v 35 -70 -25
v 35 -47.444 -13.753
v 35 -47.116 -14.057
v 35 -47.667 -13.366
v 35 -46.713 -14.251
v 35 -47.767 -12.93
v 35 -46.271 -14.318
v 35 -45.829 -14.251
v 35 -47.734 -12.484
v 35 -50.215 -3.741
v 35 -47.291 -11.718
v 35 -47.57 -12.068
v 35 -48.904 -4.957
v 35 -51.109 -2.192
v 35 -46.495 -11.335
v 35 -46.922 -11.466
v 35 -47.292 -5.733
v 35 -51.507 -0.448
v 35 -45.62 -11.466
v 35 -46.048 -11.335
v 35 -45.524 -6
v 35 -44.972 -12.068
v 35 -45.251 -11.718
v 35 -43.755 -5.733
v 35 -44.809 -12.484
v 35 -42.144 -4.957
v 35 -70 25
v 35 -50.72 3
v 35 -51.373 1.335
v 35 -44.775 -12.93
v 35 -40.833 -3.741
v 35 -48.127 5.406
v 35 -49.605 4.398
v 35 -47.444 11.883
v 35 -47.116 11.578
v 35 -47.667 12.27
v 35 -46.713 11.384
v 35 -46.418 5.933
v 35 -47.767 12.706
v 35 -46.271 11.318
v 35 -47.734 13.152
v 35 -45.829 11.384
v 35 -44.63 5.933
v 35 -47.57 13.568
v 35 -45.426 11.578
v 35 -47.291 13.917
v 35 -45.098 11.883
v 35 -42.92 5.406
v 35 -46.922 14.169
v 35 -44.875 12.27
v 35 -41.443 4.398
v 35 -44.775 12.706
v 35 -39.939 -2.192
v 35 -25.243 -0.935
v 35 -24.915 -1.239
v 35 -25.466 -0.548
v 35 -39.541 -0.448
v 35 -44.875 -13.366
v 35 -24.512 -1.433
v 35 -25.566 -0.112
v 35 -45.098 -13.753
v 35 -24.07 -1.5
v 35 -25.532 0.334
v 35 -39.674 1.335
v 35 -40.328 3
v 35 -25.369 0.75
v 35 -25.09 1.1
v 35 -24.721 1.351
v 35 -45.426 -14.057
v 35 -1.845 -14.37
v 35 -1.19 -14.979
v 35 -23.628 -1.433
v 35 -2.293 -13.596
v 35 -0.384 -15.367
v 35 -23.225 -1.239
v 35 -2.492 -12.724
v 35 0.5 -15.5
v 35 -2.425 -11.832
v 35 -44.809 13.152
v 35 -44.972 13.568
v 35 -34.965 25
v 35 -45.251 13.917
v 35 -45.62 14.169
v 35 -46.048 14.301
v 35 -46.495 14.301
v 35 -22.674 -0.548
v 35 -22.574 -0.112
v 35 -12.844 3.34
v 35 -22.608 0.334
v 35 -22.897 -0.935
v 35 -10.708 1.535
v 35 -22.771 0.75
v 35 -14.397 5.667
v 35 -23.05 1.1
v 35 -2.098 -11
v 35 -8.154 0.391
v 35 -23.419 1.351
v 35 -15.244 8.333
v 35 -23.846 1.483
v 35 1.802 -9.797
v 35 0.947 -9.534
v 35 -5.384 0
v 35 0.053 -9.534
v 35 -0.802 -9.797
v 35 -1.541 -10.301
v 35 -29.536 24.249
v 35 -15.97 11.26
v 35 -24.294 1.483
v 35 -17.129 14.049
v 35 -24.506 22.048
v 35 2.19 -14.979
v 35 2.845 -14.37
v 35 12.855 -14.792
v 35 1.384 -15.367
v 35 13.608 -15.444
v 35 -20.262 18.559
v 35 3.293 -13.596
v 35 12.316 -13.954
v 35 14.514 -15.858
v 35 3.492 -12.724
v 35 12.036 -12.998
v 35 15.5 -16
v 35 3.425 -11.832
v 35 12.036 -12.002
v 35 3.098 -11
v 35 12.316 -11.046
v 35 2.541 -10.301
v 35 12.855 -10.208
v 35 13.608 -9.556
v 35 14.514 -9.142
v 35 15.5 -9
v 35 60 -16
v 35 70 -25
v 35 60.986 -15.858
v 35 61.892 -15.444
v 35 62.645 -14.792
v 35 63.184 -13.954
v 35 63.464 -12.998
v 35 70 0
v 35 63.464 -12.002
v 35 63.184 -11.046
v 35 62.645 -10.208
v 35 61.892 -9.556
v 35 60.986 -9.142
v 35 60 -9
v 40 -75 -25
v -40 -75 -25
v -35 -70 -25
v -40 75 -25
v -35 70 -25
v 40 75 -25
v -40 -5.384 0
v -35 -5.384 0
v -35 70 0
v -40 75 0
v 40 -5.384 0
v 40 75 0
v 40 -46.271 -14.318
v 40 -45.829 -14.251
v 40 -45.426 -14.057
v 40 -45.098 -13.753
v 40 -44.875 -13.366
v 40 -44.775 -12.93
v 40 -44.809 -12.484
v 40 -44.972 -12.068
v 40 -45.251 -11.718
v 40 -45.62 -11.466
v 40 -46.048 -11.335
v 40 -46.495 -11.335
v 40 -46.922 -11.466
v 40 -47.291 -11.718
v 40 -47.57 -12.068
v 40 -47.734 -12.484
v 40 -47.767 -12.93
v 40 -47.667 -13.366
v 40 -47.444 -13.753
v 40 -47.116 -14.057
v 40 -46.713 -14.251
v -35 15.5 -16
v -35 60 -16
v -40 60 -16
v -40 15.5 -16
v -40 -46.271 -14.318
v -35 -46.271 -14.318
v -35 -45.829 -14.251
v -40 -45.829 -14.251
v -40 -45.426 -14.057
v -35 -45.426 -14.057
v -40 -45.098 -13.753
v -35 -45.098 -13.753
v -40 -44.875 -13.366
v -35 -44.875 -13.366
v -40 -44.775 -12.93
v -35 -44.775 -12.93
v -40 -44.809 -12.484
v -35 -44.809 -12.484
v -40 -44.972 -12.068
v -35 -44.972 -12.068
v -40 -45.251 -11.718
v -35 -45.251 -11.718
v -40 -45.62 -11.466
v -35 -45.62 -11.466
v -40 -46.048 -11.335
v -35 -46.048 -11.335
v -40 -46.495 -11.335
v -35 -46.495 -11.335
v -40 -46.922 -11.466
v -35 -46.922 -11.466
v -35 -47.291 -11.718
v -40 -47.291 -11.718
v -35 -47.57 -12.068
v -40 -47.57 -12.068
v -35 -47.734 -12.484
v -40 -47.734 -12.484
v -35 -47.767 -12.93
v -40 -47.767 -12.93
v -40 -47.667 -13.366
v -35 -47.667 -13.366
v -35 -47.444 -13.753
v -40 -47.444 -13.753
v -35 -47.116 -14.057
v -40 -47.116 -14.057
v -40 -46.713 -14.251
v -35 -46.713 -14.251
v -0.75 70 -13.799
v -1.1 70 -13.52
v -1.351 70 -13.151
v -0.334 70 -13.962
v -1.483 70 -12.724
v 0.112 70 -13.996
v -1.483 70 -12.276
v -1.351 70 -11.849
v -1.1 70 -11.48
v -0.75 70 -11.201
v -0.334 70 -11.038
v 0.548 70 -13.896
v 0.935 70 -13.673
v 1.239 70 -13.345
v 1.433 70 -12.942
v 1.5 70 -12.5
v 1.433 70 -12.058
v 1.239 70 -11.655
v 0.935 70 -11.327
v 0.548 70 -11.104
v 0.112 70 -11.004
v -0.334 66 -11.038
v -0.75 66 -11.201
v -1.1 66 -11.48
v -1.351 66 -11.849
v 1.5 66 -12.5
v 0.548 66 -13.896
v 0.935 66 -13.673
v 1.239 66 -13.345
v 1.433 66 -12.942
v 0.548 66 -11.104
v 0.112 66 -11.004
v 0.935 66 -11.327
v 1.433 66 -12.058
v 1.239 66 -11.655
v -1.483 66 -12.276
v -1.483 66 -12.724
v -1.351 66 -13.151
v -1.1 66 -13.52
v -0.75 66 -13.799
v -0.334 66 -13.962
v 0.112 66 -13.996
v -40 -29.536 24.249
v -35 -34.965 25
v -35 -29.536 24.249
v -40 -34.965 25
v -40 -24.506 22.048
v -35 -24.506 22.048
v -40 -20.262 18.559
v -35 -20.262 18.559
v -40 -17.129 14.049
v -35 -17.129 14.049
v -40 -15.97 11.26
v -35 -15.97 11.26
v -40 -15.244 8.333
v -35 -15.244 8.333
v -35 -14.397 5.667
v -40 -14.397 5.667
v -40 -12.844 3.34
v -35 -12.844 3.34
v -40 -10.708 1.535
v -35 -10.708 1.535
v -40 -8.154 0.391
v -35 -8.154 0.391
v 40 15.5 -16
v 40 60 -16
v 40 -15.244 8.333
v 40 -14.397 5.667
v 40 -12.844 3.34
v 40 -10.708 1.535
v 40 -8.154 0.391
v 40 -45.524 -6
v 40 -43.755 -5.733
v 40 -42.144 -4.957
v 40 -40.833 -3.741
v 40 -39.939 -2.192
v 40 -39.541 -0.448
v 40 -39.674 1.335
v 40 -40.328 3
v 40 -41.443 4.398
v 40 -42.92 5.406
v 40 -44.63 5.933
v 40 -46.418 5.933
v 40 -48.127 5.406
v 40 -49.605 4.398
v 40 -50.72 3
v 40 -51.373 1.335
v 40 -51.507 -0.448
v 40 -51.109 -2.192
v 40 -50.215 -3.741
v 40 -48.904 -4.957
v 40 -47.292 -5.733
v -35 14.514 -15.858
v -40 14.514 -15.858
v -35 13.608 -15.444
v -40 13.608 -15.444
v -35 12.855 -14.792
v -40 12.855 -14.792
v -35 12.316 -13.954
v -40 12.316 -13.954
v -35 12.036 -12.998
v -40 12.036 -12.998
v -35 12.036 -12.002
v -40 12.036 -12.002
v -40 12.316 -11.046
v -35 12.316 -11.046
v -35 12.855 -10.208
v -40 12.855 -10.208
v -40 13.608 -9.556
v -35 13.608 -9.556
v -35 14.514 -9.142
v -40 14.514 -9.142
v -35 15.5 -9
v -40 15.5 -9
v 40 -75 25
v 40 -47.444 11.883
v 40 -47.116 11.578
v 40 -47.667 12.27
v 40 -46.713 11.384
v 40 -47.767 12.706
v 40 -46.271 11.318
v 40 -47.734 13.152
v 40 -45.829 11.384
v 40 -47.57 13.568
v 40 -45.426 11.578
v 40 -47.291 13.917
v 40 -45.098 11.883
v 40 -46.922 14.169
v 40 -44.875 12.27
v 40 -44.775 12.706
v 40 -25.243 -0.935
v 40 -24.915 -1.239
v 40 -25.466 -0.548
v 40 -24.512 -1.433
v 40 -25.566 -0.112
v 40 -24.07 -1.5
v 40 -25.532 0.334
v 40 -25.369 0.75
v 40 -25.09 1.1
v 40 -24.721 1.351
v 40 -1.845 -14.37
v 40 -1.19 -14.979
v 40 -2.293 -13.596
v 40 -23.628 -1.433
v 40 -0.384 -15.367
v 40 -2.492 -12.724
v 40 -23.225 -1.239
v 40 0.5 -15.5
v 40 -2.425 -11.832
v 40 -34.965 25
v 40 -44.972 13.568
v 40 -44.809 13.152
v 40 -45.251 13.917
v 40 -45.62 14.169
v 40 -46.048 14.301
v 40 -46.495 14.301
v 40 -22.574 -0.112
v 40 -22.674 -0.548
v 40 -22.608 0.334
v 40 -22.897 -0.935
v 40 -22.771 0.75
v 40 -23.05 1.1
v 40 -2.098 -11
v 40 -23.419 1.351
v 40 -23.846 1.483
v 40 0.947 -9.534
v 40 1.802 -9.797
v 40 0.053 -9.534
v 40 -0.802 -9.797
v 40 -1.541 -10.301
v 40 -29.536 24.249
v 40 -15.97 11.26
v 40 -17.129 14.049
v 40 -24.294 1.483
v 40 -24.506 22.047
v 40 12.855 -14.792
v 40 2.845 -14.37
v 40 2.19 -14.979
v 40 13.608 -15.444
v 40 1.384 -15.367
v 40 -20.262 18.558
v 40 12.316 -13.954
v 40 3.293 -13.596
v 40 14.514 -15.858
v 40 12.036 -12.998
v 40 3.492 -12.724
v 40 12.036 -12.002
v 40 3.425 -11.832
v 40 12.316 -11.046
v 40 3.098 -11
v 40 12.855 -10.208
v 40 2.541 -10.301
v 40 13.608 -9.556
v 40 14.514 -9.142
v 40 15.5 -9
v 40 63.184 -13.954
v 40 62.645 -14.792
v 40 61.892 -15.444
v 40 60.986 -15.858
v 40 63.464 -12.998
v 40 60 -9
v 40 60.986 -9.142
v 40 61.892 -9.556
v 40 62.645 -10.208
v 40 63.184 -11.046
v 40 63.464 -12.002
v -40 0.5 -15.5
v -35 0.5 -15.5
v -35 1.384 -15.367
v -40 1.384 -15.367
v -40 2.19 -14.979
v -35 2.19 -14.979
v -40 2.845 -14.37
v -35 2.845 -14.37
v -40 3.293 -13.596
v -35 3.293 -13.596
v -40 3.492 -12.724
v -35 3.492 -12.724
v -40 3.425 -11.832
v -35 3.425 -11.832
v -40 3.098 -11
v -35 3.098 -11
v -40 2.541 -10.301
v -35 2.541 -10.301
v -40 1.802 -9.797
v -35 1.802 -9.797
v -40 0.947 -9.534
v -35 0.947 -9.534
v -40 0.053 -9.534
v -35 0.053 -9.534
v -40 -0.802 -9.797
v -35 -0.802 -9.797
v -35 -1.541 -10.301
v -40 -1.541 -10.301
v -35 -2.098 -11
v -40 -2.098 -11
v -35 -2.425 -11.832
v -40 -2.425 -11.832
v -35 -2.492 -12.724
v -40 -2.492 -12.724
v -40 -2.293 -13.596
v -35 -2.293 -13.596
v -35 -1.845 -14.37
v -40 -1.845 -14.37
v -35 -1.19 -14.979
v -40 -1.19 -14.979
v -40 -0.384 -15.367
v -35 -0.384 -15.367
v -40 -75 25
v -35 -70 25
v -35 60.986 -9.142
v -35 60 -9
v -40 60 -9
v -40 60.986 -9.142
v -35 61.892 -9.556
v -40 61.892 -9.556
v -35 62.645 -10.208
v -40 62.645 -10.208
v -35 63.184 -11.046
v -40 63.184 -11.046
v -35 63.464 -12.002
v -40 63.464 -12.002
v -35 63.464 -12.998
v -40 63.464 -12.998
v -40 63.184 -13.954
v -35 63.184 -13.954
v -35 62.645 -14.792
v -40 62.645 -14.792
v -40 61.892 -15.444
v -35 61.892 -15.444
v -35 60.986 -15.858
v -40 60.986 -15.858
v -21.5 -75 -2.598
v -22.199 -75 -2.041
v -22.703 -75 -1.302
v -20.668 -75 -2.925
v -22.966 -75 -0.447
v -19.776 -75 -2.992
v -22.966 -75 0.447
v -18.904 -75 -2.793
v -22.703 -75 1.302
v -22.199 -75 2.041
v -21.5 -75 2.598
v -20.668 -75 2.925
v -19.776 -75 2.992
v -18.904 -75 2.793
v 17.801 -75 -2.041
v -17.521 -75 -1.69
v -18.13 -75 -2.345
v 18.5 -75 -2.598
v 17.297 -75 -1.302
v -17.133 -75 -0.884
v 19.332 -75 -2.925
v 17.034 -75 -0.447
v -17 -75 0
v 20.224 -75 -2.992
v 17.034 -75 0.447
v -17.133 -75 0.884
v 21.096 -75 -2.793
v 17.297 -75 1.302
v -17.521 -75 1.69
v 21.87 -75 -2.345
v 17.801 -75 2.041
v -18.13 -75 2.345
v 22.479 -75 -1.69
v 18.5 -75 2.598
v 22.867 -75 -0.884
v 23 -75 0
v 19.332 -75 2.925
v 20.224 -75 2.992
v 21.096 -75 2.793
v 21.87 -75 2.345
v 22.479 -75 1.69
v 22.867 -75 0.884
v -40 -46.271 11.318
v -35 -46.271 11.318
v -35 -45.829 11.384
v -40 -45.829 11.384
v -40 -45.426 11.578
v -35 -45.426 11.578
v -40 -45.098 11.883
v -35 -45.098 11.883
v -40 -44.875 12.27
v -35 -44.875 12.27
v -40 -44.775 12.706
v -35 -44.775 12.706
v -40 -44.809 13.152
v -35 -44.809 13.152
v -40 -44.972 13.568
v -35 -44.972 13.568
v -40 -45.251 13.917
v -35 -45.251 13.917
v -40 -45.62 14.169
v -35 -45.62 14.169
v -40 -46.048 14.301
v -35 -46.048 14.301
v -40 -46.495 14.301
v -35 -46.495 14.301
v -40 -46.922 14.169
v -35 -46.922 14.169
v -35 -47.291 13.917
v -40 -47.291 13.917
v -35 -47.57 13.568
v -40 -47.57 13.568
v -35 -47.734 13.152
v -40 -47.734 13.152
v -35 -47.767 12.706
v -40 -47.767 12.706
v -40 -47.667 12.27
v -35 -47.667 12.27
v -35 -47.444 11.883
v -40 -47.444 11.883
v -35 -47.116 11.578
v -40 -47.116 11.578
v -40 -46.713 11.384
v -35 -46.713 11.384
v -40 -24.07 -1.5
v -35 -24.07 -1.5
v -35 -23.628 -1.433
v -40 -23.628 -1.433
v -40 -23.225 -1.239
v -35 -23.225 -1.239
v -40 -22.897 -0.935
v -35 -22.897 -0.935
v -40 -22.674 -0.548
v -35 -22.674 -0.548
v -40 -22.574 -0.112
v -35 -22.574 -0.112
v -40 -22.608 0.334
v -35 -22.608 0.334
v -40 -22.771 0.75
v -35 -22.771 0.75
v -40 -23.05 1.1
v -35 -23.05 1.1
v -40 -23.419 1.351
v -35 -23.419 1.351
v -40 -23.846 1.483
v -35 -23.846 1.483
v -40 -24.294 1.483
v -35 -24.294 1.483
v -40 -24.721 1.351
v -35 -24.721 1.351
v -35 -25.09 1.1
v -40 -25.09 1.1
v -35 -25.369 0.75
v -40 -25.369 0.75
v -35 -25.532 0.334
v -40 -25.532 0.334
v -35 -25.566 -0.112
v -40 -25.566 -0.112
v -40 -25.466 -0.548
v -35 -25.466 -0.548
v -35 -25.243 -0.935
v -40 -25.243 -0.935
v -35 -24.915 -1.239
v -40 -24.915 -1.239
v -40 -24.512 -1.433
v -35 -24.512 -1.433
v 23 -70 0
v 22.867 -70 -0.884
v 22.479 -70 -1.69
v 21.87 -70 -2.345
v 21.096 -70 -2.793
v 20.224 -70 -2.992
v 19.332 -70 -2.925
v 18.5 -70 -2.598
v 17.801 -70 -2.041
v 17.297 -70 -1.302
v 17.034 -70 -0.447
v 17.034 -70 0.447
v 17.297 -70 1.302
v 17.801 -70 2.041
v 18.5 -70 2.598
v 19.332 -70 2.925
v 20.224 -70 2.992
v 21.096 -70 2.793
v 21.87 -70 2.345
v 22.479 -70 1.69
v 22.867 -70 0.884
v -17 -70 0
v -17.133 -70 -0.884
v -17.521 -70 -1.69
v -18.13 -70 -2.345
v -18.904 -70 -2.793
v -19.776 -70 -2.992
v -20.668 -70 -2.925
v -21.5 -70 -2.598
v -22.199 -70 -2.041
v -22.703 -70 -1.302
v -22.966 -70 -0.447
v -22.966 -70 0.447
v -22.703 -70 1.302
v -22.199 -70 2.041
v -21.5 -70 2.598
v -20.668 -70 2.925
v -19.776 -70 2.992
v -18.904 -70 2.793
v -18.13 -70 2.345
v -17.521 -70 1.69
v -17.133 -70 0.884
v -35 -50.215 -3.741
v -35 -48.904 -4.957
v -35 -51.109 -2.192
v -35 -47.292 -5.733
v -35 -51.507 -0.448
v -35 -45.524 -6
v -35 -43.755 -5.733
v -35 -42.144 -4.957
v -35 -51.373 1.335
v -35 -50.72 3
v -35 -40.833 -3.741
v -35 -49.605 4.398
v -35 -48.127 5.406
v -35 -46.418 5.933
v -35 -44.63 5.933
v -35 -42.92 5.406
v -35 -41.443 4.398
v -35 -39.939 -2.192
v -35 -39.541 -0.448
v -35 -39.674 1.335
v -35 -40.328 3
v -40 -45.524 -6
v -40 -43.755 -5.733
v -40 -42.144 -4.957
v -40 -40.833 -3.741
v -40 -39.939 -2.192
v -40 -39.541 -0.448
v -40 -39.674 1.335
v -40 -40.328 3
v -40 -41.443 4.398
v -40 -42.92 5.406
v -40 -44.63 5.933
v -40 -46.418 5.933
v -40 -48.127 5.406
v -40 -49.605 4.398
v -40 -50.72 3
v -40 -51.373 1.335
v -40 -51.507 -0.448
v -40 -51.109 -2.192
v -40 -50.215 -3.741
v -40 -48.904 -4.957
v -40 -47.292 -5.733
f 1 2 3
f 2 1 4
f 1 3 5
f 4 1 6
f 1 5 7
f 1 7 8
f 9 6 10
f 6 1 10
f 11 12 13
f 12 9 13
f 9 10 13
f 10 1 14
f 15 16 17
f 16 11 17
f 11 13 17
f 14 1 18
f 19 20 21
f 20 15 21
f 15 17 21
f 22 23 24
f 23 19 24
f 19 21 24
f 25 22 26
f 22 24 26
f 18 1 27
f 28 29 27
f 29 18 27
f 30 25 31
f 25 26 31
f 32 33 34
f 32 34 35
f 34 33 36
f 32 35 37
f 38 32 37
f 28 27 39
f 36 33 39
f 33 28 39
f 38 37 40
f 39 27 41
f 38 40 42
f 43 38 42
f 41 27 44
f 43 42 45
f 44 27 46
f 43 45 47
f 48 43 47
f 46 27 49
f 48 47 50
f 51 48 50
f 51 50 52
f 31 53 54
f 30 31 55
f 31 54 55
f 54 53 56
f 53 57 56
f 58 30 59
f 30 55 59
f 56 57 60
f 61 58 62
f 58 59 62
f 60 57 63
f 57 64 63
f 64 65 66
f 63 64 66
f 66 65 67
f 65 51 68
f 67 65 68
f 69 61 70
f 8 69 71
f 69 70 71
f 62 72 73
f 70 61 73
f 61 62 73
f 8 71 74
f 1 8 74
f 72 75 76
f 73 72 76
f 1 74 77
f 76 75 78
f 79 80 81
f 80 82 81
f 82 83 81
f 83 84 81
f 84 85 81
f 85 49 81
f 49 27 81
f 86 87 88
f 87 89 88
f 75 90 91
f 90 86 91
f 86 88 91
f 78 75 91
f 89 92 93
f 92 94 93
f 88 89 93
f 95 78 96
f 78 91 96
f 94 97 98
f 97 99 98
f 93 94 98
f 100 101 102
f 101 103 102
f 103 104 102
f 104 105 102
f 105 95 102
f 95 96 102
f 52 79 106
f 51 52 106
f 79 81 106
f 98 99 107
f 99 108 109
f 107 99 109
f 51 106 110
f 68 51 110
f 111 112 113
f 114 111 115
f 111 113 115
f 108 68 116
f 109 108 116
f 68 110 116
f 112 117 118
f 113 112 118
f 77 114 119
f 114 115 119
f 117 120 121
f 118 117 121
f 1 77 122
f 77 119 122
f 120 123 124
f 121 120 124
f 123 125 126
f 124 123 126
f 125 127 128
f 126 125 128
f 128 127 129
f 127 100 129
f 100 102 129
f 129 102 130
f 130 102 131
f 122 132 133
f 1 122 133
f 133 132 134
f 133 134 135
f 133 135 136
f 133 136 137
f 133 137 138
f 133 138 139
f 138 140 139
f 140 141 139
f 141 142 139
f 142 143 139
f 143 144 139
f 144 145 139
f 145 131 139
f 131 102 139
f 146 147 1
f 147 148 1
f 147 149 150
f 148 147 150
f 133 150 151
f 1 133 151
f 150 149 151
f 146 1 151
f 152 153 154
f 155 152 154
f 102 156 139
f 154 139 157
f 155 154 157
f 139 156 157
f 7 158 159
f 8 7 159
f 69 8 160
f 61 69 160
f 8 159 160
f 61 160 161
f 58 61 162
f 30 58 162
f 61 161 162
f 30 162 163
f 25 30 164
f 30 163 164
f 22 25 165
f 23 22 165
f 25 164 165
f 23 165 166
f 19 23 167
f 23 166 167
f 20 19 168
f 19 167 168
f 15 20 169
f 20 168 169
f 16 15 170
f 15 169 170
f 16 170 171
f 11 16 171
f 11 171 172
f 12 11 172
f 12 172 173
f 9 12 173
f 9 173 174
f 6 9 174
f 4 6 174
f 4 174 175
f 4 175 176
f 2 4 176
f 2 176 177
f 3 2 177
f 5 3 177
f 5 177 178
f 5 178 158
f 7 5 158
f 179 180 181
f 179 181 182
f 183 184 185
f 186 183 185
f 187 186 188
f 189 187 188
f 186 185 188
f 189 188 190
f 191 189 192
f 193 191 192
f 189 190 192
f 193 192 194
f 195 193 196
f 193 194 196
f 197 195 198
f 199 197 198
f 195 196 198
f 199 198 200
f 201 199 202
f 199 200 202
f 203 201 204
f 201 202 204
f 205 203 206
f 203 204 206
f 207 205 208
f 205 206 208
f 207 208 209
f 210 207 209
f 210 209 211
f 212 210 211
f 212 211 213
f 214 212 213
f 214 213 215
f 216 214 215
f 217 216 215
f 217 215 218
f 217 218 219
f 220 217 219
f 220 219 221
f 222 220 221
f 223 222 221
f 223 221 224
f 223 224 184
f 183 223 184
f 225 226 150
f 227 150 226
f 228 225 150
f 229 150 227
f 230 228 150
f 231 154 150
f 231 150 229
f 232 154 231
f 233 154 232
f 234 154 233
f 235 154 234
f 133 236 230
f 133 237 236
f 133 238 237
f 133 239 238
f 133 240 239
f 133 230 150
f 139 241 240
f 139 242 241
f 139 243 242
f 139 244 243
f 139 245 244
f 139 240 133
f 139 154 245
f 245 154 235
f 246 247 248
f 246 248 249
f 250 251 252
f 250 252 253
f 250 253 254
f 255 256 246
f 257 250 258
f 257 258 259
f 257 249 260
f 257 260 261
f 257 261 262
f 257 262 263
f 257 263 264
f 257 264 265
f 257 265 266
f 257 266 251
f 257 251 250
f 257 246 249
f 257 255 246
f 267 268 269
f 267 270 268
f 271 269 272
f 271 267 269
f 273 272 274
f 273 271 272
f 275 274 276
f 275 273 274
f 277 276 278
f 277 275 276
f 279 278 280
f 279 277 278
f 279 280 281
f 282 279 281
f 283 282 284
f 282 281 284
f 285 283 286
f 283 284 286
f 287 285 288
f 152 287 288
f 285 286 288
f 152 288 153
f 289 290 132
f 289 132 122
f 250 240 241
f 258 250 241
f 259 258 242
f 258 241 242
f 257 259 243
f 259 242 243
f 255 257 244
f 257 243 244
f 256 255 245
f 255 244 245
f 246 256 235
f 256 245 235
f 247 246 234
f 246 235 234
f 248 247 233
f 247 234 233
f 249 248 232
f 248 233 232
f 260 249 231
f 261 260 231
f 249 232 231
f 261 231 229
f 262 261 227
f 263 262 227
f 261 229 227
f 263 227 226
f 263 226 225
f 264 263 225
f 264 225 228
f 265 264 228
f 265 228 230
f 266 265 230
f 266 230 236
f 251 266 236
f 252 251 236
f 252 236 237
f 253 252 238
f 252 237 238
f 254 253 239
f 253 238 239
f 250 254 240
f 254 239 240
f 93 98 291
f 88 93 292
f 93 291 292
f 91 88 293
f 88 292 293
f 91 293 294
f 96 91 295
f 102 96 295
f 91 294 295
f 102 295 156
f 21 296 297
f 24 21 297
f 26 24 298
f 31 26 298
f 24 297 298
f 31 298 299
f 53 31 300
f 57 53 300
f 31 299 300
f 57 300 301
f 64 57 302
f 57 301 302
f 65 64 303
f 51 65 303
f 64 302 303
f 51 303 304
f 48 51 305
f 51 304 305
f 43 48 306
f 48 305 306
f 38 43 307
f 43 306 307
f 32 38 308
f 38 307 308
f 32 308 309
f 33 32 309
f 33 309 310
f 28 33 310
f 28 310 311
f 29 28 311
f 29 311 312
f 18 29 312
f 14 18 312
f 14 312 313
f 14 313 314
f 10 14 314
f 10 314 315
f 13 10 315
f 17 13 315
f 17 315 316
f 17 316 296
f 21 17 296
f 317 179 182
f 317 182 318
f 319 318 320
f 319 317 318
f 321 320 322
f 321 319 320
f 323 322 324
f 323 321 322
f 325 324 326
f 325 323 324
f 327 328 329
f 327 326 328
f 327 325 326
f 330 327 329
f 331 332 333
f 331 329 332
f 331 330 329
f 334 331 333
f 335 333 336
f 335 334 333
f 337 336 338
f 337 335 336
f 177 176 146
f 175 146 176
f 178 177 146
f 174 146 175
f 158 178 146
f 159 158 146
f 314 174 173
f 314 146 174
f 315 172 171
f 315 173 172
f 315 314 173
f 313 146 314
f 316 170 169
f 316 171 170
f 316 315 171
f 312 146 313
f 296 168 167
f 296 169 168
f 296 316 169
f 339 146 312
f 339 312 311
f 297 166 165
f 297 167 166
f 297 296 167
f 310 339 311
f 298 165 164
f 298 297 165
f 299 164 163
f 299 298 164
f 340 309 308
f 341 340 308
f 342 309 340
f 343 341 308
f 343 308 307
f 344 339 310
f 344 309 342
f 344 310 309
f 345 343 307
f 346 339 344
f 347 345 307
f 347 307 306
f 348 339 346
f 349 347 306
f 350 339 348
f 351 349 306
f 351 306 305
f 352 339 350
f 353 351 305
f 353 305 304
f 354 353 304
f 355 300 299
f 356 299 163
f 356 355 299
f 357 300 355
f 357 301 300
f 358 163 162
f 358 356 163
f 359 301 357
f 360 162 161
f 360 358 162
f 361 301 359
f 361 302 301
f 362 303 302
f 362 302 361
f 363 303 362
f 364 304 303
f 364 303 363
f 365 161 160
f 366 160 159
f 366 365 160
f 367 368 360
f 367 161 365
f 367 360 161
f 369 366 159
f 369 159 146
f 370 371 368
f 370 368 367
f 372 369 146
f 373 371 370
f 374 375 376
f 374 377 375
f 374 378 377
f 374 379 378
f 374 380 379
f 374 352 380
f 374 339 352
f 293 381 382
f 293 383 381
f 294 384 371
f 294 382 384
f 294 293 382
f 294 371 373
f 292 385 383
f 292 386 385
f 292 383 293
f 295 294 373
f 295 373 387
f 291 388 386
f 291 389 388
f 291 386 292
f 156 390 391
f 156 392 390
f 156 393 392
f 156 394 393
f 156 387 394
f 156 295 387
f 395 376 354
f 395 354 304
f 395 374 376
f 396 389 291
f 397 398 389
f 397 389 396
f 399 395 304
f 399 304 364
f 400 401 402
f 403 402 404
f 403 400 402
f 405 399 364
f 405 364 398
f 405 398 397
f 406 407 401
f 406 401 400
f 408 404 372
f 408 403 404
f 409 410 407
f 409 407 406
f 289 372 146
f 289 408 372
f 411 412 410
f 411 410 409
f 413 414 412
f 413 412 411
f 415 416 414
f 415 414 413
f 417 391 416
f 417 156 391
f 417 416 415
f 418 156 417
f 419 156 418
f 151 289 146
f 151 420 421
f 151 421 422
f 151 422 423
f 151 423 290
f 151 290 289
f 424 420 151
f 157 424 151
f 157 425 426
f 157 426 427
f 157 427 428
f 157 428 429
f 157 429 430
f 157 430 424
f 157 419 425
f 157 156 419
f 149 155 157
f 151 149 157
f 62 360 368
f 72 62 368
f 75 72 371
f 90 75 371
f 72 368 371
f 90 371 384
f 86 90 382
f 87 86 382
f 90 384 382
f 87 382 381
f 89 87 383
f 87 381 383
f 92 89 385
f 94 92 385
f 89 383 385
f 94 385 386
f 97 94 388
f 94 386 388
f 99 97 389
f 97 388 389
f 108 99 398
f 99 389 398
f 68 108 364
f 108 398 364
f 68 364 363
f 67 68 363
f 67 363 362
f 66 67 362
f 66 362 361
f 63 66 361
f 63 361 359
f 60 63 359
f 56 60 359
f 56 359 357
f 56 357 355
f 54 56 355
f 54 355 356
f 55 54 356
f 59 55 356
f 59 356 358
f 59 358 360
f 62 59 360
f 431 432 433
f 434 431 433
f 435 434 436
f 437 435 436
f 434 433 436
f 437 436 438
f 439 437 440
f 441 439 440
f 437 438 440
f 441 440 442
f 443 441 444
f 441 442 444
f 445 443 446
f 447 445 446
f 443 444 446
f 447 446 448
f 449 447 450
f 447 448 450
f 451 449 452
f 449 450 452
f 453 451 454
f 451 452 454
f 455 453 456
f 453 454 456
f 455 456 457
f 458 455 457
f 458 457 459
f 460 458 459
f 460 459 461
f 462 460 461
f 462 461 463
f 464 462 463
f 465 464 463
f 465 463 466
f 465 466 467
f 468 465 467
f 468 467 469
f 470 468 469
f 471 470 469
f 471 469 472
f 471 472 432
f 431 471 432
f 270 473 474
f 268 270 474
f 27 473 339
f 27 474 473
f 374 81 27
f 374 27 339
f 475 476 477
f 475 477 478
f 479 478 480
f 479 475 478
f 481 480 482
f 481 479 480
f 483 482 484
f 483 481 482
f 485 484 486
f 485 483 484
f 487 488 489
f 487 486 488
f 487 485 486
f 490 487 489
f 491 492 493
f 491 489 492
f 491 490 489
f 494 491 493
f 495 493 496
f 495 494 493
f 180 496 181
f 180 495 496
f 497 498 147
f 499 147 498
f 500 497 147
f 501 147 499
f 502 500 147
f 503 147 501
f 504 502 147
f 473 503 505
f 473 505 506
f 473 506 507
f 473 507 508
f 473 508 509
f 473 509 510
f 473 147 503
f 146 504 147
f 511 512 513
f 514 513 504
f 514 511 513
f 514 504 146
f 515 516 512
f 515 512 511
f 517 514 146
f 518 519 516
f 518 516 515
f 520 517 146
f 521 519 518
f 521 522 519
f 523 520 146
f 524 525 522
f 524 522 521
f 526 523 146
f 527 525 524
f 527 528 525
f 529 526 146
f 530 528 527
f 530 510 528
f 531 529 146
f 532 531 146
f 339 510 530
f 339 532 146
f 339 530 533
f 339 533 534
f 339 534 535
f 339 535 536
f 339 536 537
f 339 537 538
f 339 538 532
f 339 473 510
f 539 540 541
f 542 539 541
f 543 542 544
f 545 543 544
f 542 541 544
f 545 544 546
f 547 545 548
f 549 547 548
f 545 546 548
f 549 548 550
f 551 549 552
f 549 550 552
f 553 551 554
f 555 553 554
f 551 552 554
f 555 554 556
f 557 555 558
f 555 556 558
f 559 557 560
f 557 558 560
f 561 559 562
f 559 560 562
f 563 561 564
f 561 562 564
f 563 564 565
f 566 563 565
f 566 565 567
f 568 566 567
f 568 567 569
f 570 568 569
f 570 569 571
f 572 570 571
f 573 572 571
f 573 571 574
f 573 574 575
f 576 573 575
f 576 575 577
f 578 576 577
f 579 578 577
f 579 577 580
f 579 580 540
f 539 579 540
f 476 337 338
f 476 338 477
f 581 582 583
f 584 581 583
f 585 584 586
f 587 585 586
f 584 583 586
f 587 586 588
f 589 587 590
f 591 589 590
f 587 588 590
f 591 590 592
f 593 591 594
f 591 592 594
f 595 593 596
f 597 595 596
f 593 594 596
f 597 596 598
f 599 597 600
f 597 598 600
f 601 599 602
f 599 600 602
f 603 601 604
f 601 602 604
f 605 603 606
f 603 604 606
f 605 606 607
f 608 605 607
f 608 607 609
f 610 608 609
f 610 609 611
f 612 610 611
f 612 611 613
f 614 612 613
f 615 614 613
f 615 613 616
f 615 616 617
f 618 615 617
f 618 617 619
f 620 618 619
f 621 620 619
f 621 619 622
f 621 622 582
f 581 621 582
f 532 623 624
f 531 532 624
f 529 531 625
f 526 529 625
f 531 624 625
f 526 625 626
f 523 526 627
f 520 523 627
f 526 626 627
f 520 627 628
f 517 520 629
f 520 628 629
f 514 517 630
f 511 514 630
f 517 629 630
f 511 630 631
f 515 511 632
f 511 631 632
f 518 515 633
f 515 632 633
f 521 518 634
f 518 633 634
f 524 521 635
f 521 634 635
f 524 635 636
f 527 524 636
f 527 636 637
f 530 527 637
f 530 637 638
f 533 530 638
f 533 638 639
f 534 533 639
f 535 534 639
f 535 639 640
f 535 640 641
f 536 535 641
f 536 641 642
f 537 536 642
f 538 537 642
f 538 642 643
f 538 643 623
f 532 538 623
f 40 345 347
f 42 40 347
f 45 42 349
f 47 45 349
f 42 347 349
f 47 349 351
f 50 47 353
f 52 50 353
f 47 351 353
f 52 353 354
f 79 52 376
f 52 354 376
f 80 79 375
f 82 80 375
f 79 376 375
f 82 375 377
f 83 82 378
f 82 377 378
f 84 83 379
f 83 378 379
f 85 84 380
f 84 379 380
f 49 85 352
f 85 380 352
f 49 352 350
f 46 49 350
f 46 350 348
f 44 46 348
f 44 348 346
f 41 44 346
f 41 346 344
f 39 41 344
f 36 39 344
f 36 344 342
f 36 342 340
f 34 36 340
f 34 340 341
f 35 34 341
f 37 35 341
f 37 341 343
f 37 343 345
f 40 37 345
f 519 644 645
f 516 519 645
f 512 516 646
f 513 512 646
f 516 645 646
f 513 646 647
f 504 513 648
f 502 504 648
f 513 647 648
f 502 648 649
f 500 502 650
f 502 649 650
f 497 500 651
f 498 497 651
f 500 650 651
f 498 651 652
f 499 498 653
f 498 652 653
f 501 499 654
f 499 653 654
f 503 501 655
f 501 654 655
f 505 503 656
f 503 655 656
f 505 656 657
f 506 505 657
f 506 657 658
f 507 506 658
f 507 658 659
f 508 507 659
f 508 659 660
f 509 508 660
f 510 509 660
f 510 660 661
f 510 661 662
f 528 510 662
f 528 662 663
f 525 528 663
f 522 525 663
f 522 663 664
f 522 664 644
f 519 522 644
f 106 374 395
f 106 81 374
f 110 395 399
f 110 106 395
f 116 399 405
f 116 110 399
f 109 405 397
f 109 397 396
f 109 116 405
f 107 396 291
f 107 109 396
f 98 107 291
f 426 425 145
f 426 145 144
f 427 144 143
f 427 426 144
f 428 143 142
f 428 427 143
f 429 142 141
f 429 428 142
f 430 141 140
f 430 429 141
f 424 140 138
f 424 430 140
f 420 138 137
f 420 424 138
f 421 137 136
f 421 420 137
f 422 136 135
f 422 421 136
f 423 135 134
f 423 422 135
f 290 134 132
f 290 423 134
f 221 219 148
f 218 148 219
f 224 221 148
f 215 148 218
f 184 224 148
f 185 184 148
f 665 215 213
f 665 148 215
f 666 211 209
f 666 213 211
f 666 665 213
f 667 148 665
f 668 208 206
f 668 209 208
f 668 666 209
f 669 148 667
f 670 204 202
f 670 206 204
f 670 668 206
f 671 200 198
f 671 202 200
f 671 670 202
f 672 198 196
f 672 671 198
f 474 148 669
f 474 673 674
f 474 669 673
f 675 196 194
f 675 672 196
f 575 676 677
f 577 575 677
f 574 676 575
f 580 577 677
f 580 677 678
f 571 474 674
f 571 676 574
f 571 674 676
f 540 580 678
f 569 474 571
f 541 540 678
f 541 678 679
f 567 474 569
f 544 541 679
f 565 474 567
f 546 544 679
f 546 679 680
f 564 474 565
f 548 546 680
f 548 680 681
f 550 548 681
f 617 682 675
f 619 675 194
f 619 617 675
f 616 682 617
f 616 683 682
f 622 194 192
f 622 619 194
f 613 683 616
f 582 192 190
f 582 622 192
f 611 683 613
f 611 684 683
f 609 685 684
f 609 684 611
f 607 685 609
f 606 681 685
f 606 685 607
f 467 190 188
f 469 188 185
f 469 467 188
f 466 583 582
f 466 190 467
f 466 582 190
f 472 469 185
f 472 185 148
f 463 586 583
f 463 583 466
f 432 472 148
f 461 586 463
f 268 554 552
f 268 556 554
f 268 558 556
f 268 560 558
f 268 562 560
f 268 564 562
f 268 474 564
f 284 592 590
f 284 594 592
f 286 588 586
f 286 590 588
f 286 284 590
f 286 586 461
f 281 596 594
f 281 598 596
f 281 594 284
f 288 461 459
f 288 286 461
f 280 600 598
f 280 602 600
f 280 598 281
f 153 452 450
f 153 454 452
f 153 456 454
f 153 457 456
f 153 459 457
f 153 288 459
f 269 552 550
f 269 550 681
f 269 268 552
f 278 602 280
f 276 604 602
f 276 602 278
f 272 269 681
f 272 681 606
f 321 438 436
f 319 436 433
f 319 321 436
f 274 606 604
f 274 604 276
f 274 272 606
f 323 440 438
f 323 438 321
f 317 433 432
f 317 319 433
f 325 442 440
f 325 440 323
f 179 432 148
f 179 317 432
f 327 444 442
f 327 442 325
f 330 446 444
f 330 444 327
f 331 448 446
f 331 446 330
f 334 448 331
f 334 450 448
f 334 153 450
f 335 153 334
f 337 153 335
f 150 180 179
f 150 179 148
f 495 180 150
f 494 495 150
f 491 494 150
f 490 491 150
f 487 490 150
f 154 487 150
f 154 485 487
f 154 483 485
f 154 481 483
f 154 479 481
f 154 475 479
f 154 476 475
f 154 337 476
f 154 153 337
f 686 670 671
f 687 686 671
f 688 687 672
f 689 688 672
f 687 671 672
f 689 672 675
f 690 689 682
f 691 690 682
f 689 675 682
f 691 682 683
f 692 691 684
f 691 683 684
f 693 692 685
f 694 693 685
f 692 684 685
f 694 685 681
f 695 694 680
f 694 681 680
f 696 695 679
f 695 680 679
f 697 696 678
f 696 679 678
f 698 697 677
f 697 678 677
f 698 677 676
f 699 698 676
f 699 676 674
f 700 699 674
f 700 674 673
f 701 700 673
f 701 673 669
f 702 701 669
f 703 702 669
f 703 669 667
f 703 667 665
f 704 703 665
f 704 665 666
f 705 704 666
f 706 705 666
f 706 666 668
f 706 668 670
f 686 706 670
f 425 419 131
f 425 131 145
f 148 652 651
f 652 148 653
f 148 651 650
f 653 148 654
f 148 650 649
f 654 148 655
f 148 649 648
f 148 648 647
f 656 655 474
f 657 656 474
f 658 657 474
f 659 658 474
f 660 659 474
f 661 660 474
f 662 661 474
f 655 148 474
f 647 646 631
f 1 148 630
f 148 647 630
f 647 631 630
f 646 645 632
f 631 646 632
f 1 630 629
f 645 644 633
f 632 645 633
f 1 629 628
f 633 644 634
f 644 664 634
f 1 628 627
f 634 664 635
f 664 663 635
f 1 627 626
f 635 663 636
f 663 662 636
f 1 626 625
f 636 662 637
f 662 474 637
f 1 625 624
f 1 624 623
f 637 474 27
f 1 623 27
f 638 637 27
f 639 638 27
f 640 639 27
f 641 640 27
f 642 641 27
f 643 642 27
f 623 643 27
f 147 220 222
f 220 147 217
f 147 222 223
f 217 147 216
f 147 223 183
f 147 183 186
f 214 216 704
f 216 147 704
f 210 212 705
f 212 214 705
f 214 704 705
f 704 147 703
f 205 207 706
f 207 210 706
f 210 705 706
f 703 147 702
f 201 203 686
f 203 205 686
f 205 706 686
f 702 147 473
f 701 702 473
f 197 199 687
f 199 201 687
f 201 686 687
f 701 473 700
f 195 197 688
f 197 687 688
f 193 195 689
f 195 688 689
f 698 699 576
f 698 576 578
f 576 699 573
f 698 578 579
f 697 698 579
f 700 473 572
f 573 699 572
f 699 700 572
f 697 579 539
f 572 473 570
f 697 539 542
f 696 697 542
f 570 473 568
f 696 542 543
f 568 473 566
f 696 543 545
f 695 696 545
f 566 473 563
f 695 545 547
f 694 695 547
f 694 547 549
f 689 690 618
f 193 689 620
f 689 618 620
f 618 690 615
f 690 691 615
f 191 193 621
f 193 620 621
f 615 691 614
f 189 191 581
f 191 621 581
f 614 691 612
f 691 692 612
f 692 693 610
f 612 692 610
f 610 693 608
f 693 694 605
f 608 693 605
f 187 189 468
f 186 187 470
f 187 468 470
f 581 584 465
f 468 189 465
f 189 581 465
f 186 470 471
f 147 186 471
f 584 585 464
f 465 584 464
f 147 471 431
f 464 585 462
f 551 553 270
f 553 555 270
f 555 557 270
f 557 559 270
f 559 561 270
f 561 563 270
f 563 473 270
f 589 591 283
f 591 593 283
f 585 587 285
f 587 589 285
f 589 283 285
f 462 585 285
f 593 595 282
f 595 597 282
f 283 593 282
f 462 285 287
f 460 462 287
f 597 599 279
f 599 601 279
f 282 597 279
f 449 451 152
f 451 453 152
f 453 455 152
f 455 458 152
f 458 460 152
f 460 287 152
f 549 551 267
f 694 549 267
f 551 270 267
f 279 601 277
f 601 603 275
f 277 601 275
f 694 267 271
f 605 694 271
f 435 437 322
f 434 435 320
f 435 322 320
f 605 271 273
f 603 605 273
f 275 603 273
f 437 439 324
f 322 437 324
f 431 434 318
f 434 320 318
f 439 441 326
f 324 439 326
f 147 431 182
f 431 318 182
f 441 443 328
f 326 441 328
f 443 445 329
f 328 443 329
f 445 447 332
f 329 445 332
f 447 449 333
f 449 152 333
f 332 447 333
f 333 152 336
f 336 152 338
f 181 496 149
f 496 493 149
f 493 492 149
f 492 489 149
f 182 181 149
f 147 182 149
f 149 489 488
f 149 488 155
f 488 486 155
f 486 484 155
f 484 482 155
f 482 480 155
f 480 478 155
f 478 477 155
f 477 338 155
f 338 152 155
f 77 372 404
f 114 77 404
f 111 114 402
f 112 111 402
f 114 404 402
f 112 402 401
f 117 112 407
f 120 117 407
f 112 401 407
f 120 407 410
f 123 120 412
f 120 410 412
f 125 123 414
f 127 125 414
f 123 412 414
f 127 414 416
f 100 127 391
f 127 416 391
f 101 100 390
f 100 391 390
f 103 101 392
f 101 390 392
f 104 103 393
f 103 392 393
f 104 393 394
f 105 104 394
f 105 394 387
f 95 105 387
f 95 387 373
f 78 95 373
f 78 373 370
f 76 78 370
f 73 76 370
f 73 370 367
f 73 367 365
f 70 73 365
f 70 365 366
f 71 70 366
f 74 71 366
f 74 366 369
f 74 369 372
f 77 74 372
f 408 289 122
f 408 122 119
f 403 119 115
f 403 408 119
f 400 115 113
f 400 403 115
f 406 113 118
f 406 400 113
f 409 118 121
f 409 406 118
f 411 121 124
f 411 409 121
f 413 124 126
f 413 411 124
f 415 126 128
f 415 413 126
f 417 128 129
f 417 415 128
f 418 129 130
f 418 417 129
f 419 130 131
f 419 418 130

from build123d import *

# Parameters (mm, degrees)
SKETCH1_W               = 80
SKETCH1_H               = 150
SKETCH1_W_2             = 70
SKETCH1_H_2             = 140
EXTRUDE_THIN1_DEPTH     = 25
CUT_EXTRUDE1_DEPTH      = 1
CUT_EXTRUDE1_DEPTH_BACK = 81
FILLET1_R               = 20
SKETCH3_R               = 3
SKETCH3_R_2             = 1.5
SKETCH3_R_3             = 6
CUT_EXTRUDE2_DEPTH      = 1.0000001
CUT_EXTRUDE2_DEPTH_BACK = 81.0000001
SKETCH5_R               = 1.5
BOSS_EXTRUDE1_DEPTH     = 4
SKETCH6_R               = 3
CUT_EXTRUDE3_DEPTH      = 10


with BuildPart() as part:
    # Sketch1 → Extrude-Thin1 (new body, symmetric)
    with BuildSketch(Plane.XY):
        Rectangle(SKETCH1_W, SKETCH1_H)
        Rectangle(SKETCH1_W_2, SKETCH1_H_2, mode=Mode.SUBTRACT)
    extrude(amount=EXTRUDE_THIN1_DEPTH, both=True)

    # Sketch2 → Cut-Extrude1 (cut, two sides)
    with BuildSketch(Plane(origin=(40, 0, 0), x_dir=(0, 0, -1), z_dir=(1, 0, 0))) as cut_extrude1_sk:
        with BuildLine():
            Line((-25, -15.384333338), (-10, -15.384333338))
            ThreePointArc((-10, -15.384333338), (-2.928932188, -12.45540115), (0, -5.384333338))
            Line((0, -5.384333338), (0, 75))
            Line((0, 75), (-25, 75))
            Line((-25, 75), (-25, -15.384333338))
        make_face()
    extrude(amount=CUT_EXTRUDE1_DEPTH, mode=Mode.SUBTRACT)
    extrude(cut_extrude1_sk.sketch, amount=-CUT_EXTRUDE1_DEPTH_BACK, mode=Mode.SUBTRACT)

    # Fillet1
    fillet1_edges = [part.edges().sort_by_distance(p)[0] for p in [
        (-37.5, -15.384333338, 25),
        (37.5, -15.384333338, 25),
    ]]
    fillet(fillet1_edges, radius=FILLET1_R)

    # Sketch3 → Cut-Extrude2 (cut, two sides)
    with BuildSketch(Plane(origin=(40, 0, 0), x_dir=(0, 0, -1), z_dir=(1, 0, 0))) as cut_extrude2_sk:
        with Locations((12.5, 0.5)):
            Circle(SKETCH3_R)
        with Locations((0, -24.070063275)):
            Circle(SKETCH3_R_2)
        with Locations((12.817814142, -46.271168612)):
            Circle(SKETCH3_R_2)
        with Locations((0, -45.523799356)):
            Circle(SKETCH3_R_3)
        with Locations((-12.817814142, -46.271168612)):
            Circle(SKETCH3_R_2)
        with BuildLine():
            Line((16, 60), (16, 15.5))
            ThreePointArc((16, 15.5), (12.5, 12), (9, 15.5))
            Line((9, 15.5), (9, 60))
            ThreePointArc((9, 60), (12.5, 63.5), (16, 60))
        make_face()
    extrude(amount=CUT_EXTRUDE2_DEPTH, mode=Mode.SUBTRACT)
    extrude(cut_extrude2_sk.sketch, amount=-CUT_EXTRUDE2_DEPTH_BACK, mode=Mode.SUBTRACT)

    # Sketch5 → Boss-Extrude1 (add)
    with BuildSketch(Plane.XZ.offset(-70)):
        with Locations((0, -12.5)):
            Circle(SKETCH5_R)
    extrude(amount=BOSS_EXTRUDE1_DEPTH)

    # Sketch6 → Cut-Extrude3 (cut)
    with BuildSketch(Plane(origin=(0, -70, 0), x_dir=(1, 0, 0), z_dir=(0, 1, 0))):
        with Locations((20, 0)):
            Circle(SKETCH6_R)
        with Locations((-20, 0)):
            Circle(SKETCH6_R)
    extrude(amount=-CUT_EXTRUDE3_DEPTH, mode=Mode.SUBTRACT)


solid = part.part
